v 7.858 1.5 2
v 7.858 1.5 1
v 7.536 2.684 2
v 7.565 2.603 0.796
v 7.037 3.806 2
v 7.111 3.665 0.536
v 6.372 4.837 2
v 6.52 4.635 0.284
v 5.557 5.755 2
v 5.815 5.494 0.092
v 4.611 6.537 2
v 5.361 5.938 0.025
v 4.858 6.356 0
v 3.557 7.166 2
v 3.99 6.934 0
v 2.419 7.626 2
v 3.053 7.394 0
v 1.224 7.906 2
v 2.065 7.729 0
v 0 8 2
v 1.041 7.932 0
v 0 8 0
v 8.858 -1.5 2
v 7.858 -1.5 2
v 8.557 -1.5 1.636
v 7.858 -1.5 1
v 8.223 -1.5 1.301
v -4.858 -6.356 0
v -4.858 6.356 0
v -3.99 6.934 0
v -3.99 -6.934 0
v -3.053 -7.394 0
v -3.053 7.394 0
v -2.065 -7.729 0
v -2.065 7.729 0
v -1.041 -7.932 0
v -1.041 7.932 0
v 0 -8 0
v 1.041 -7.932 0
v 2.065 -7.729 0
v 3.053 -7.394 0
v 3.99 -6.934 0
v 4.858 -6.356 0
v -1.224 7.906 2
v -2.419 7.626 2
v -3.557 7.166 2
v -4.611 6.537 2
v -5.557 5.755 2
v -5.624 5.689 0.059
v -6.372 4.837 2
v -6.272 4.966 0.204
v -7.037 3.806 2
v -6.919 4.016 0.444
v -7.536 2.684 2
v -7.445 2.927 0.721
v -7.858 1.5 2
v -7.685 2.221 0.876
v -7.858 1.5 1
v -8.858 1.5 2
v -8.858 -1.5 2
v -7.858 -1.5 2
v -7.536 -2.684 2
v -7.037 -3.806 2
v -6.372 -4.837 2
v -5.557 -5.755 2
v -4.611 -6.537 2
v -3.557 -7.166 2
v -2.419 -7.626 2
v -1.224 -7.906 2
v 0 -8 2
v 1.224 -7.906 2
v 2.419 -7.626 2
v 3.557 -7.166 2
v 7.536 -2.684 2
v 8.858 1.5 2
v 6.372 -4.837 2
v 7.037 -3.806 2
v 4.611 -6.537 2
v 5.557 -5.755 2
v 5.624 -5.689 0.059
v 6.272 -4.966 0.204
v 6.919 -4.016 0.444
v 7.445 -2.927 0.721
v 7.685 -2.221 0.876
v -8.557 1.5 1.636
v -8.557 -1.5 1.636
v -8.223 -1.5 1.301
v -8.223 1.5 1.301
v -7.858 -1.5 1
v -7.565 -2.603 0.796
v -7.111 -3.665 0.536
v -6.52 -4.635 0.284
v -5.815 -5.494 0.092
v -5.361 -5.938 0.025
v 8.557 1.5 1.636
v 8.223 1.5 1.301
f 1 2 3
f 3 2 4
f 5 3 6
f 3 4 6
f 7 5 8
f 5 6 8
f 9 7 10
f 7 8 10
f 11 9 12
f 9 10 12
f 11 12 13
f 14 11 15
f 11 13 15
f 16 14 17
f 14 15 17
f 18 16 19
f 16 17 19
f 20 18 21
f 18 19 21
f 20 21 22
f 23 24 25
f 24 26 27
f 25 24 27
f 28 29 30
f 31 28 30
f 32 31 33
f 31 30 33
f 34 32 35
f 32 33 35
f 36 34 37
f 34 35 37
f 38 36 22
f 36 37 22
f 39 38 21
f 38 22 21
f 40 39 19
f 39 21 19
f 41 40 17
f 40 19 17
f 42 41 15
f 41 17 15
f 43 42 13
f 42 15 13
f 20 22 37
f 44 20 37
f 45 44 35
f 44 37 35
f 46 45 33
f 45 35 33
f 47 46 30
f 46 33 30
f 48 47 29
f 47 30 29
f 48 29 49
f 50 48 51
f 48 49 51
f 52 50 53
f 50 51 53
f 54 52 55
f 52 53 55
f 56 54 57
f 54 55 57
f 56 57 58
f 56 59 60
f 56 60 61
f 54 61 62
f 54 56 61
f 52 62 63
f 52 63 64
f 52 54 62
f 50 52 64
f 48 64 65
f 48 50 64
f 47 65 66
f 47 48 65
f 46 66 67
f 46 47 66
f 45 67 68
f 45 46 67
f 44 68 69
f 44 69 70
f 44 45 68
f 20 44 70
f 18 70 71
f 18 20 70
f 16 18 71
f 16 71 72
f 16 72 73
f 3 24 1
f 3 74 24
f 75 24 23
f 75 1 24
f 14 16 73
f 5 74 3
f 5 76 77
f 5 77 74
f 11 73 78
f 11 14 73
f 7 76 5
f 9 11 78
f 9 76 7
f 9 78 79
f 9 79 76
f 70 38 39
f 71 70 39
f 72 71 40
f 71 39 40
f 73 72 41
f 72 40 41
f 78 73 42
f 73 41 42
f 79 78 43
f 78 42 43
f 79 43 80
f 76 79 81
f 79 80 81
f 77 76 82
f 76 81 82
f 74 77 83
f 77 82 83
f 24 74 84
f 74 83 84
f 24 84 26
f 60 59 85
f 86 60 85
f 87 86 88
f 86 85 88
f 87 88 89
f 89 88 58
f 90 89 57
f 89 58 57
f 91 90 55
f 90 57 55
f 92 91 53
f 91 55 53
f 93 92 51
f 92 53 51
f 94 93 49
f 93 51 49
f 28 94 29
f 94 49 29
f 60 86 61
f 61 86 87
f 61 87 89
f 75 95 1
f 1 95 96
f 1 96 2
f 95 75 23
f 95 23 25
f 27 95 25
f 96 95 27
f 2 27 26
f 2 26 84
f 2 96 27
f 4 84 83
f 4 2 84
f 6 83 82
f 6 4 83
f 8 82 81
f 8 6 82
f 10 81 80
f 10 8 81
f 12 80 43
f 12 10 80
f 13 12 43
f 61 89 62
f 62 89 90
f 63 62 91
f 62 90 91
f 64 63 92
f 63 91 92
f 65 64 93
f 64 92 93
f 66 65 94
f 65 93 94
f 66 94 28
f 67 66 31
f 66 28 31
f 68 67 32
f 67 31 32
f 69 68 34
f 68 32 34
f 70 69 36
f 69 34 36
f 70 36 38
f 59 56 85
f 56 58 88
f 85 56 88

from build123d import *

# Parameters (mm, degrees)
F1_DEPTH    = 2
F2_T1_DEPTH = 23


# Not quite as in the source:
# - a fillet or chamfer that OpenCascade refuses, or shapes differently, is made with other operations: its cross-section is extruded or revolved along the edge and cut away or added


with BuildPart() as f1:
    # F0 (on Top) → F1 (new body)
    with BuildSketch(Plane.XY):
        with BuildLine():
            Line((0, 0), (8, 0))
            ThreePointArc((8, 0), (7.964450219, 0.7533476681), (7.8581168228, 1.5))
            ThreePointArc((7.8581168228, 1.5), (5.0990195136, 6.164414003), (0, 8))
            Line((0, 8), (0, 0))
        make_face()
        with BuildLine():
            Line((8.8581168228, 0), (8, 0))
            ThreePointArc((8, 0), (7.964450219, -0.7533476681), (7.8581168228, -1.5))
            Line((7.8581168228, -1.5), (8.8581168228, -1.5))
            Line((8.8581168228, -1.5), (8.8581168228, 0))
        make_face()
        with BuildLine():
            ThreePointArc((7.8581168228, 1.5), (7.964450219, 0.7533476681), (8, 0))
            Line((8, 0), (8.8581168228, 0))
            Line((8.8581168228, 0), (8.8581168228, 1.5))
            Line((8.8581168228, 1.5), (7.8581168228, 1.5))
        make_face()
        with BuildLine():
            ThreePointArc((7.8581168228, -1.5), (7.964450219, -0.7533476681), (8, 0))
            Line((8, 0), (0, 0))
            Line((0, 0), (0, -8))
            ThreePointArc((0, -8), (5.0990195136, -6.164414003), (7.8581168228, -1.5))
        make_face()
        with BuildLine():
            Line((-8, 0), (0, 0))
            Line((0, 0), (0, 8))
            ThreePointArc((0, 8), (-5.0990195136, 6.164414003), (-7.8581168228, 1.5))
            ThreePointArc((-7.8581168228, 1.5), (-7.964450219, 0.7533476681), (-8, 0))
        make_face()
        with BuildLine():
            Line((0, -8), (0, 0))
            Line((0, 0), (-8, 0))
            ThreePointArc((-8, 0), (-7.964450219, -0.7533476681), (-7.8581168228, -1.5))
            ThreePointArc((-7.8581168228, -1.5), (-5.0990195136, -6.164414003), (0, -8))
        make_face()
        with BuildLine():
            Line((-8.8581168228, 0), (-8, 0))
            ThreePointArc((-8, 0), (-7.964450219, 0.7533476681), (-7.8581168228, 1.5))
            Line((-7.8581168228, 1.5), (-8.8581168228, 1.5))
            Line((-8.8581168228, 1.5), (-8.8581168228, 0))
        make_face()
        with BuildLine():
            ThreePointArc((-7.8581168228, -1.5), (-7.964450219, -0.7533476681), (-8, 0))
            Line((-8, 0), (-8.8581168228, 0))
            Line((-8.8581168228, 0), (-8.8581168228, -1.5))
            Line((-8.8581168228, -1.5), (-7.8581168228, -1.5))
        make_face()
    extrude(amount=F1_DEPTH)

    # F2: fillet of radius 5 on 2 edges, made by hand

    # F2_s2 → F2_t1 (cut)
    with BuildSketch(Plane.XZ.offset(-11.5)):
        with BuildLine():
            ThreePointArc((-8.8581168228, 2), (-7.0941848003, 0.527864045), (-4.8581168228, 0))
            Line((-4.8581168228, 0), (-8.8581168228, 0))
            Line((-8.8581168228, 0), (-8.8581168228, 2))
        make_face()
        with BuildLine():
            ThreePointArc((8.8581168228, 2), (7.0941848003, 0.527864045), (4.8581168228, 0))
            Line((4.8581168228, 0), (8.8581168228, 0))
            Line((8.8581168228, 0), (8.8581168228, 2))
        make_face()
    extrude(amount=F2_T1_DEPTH, mode=Mode.SUBTRACT)


solid = f1.part
